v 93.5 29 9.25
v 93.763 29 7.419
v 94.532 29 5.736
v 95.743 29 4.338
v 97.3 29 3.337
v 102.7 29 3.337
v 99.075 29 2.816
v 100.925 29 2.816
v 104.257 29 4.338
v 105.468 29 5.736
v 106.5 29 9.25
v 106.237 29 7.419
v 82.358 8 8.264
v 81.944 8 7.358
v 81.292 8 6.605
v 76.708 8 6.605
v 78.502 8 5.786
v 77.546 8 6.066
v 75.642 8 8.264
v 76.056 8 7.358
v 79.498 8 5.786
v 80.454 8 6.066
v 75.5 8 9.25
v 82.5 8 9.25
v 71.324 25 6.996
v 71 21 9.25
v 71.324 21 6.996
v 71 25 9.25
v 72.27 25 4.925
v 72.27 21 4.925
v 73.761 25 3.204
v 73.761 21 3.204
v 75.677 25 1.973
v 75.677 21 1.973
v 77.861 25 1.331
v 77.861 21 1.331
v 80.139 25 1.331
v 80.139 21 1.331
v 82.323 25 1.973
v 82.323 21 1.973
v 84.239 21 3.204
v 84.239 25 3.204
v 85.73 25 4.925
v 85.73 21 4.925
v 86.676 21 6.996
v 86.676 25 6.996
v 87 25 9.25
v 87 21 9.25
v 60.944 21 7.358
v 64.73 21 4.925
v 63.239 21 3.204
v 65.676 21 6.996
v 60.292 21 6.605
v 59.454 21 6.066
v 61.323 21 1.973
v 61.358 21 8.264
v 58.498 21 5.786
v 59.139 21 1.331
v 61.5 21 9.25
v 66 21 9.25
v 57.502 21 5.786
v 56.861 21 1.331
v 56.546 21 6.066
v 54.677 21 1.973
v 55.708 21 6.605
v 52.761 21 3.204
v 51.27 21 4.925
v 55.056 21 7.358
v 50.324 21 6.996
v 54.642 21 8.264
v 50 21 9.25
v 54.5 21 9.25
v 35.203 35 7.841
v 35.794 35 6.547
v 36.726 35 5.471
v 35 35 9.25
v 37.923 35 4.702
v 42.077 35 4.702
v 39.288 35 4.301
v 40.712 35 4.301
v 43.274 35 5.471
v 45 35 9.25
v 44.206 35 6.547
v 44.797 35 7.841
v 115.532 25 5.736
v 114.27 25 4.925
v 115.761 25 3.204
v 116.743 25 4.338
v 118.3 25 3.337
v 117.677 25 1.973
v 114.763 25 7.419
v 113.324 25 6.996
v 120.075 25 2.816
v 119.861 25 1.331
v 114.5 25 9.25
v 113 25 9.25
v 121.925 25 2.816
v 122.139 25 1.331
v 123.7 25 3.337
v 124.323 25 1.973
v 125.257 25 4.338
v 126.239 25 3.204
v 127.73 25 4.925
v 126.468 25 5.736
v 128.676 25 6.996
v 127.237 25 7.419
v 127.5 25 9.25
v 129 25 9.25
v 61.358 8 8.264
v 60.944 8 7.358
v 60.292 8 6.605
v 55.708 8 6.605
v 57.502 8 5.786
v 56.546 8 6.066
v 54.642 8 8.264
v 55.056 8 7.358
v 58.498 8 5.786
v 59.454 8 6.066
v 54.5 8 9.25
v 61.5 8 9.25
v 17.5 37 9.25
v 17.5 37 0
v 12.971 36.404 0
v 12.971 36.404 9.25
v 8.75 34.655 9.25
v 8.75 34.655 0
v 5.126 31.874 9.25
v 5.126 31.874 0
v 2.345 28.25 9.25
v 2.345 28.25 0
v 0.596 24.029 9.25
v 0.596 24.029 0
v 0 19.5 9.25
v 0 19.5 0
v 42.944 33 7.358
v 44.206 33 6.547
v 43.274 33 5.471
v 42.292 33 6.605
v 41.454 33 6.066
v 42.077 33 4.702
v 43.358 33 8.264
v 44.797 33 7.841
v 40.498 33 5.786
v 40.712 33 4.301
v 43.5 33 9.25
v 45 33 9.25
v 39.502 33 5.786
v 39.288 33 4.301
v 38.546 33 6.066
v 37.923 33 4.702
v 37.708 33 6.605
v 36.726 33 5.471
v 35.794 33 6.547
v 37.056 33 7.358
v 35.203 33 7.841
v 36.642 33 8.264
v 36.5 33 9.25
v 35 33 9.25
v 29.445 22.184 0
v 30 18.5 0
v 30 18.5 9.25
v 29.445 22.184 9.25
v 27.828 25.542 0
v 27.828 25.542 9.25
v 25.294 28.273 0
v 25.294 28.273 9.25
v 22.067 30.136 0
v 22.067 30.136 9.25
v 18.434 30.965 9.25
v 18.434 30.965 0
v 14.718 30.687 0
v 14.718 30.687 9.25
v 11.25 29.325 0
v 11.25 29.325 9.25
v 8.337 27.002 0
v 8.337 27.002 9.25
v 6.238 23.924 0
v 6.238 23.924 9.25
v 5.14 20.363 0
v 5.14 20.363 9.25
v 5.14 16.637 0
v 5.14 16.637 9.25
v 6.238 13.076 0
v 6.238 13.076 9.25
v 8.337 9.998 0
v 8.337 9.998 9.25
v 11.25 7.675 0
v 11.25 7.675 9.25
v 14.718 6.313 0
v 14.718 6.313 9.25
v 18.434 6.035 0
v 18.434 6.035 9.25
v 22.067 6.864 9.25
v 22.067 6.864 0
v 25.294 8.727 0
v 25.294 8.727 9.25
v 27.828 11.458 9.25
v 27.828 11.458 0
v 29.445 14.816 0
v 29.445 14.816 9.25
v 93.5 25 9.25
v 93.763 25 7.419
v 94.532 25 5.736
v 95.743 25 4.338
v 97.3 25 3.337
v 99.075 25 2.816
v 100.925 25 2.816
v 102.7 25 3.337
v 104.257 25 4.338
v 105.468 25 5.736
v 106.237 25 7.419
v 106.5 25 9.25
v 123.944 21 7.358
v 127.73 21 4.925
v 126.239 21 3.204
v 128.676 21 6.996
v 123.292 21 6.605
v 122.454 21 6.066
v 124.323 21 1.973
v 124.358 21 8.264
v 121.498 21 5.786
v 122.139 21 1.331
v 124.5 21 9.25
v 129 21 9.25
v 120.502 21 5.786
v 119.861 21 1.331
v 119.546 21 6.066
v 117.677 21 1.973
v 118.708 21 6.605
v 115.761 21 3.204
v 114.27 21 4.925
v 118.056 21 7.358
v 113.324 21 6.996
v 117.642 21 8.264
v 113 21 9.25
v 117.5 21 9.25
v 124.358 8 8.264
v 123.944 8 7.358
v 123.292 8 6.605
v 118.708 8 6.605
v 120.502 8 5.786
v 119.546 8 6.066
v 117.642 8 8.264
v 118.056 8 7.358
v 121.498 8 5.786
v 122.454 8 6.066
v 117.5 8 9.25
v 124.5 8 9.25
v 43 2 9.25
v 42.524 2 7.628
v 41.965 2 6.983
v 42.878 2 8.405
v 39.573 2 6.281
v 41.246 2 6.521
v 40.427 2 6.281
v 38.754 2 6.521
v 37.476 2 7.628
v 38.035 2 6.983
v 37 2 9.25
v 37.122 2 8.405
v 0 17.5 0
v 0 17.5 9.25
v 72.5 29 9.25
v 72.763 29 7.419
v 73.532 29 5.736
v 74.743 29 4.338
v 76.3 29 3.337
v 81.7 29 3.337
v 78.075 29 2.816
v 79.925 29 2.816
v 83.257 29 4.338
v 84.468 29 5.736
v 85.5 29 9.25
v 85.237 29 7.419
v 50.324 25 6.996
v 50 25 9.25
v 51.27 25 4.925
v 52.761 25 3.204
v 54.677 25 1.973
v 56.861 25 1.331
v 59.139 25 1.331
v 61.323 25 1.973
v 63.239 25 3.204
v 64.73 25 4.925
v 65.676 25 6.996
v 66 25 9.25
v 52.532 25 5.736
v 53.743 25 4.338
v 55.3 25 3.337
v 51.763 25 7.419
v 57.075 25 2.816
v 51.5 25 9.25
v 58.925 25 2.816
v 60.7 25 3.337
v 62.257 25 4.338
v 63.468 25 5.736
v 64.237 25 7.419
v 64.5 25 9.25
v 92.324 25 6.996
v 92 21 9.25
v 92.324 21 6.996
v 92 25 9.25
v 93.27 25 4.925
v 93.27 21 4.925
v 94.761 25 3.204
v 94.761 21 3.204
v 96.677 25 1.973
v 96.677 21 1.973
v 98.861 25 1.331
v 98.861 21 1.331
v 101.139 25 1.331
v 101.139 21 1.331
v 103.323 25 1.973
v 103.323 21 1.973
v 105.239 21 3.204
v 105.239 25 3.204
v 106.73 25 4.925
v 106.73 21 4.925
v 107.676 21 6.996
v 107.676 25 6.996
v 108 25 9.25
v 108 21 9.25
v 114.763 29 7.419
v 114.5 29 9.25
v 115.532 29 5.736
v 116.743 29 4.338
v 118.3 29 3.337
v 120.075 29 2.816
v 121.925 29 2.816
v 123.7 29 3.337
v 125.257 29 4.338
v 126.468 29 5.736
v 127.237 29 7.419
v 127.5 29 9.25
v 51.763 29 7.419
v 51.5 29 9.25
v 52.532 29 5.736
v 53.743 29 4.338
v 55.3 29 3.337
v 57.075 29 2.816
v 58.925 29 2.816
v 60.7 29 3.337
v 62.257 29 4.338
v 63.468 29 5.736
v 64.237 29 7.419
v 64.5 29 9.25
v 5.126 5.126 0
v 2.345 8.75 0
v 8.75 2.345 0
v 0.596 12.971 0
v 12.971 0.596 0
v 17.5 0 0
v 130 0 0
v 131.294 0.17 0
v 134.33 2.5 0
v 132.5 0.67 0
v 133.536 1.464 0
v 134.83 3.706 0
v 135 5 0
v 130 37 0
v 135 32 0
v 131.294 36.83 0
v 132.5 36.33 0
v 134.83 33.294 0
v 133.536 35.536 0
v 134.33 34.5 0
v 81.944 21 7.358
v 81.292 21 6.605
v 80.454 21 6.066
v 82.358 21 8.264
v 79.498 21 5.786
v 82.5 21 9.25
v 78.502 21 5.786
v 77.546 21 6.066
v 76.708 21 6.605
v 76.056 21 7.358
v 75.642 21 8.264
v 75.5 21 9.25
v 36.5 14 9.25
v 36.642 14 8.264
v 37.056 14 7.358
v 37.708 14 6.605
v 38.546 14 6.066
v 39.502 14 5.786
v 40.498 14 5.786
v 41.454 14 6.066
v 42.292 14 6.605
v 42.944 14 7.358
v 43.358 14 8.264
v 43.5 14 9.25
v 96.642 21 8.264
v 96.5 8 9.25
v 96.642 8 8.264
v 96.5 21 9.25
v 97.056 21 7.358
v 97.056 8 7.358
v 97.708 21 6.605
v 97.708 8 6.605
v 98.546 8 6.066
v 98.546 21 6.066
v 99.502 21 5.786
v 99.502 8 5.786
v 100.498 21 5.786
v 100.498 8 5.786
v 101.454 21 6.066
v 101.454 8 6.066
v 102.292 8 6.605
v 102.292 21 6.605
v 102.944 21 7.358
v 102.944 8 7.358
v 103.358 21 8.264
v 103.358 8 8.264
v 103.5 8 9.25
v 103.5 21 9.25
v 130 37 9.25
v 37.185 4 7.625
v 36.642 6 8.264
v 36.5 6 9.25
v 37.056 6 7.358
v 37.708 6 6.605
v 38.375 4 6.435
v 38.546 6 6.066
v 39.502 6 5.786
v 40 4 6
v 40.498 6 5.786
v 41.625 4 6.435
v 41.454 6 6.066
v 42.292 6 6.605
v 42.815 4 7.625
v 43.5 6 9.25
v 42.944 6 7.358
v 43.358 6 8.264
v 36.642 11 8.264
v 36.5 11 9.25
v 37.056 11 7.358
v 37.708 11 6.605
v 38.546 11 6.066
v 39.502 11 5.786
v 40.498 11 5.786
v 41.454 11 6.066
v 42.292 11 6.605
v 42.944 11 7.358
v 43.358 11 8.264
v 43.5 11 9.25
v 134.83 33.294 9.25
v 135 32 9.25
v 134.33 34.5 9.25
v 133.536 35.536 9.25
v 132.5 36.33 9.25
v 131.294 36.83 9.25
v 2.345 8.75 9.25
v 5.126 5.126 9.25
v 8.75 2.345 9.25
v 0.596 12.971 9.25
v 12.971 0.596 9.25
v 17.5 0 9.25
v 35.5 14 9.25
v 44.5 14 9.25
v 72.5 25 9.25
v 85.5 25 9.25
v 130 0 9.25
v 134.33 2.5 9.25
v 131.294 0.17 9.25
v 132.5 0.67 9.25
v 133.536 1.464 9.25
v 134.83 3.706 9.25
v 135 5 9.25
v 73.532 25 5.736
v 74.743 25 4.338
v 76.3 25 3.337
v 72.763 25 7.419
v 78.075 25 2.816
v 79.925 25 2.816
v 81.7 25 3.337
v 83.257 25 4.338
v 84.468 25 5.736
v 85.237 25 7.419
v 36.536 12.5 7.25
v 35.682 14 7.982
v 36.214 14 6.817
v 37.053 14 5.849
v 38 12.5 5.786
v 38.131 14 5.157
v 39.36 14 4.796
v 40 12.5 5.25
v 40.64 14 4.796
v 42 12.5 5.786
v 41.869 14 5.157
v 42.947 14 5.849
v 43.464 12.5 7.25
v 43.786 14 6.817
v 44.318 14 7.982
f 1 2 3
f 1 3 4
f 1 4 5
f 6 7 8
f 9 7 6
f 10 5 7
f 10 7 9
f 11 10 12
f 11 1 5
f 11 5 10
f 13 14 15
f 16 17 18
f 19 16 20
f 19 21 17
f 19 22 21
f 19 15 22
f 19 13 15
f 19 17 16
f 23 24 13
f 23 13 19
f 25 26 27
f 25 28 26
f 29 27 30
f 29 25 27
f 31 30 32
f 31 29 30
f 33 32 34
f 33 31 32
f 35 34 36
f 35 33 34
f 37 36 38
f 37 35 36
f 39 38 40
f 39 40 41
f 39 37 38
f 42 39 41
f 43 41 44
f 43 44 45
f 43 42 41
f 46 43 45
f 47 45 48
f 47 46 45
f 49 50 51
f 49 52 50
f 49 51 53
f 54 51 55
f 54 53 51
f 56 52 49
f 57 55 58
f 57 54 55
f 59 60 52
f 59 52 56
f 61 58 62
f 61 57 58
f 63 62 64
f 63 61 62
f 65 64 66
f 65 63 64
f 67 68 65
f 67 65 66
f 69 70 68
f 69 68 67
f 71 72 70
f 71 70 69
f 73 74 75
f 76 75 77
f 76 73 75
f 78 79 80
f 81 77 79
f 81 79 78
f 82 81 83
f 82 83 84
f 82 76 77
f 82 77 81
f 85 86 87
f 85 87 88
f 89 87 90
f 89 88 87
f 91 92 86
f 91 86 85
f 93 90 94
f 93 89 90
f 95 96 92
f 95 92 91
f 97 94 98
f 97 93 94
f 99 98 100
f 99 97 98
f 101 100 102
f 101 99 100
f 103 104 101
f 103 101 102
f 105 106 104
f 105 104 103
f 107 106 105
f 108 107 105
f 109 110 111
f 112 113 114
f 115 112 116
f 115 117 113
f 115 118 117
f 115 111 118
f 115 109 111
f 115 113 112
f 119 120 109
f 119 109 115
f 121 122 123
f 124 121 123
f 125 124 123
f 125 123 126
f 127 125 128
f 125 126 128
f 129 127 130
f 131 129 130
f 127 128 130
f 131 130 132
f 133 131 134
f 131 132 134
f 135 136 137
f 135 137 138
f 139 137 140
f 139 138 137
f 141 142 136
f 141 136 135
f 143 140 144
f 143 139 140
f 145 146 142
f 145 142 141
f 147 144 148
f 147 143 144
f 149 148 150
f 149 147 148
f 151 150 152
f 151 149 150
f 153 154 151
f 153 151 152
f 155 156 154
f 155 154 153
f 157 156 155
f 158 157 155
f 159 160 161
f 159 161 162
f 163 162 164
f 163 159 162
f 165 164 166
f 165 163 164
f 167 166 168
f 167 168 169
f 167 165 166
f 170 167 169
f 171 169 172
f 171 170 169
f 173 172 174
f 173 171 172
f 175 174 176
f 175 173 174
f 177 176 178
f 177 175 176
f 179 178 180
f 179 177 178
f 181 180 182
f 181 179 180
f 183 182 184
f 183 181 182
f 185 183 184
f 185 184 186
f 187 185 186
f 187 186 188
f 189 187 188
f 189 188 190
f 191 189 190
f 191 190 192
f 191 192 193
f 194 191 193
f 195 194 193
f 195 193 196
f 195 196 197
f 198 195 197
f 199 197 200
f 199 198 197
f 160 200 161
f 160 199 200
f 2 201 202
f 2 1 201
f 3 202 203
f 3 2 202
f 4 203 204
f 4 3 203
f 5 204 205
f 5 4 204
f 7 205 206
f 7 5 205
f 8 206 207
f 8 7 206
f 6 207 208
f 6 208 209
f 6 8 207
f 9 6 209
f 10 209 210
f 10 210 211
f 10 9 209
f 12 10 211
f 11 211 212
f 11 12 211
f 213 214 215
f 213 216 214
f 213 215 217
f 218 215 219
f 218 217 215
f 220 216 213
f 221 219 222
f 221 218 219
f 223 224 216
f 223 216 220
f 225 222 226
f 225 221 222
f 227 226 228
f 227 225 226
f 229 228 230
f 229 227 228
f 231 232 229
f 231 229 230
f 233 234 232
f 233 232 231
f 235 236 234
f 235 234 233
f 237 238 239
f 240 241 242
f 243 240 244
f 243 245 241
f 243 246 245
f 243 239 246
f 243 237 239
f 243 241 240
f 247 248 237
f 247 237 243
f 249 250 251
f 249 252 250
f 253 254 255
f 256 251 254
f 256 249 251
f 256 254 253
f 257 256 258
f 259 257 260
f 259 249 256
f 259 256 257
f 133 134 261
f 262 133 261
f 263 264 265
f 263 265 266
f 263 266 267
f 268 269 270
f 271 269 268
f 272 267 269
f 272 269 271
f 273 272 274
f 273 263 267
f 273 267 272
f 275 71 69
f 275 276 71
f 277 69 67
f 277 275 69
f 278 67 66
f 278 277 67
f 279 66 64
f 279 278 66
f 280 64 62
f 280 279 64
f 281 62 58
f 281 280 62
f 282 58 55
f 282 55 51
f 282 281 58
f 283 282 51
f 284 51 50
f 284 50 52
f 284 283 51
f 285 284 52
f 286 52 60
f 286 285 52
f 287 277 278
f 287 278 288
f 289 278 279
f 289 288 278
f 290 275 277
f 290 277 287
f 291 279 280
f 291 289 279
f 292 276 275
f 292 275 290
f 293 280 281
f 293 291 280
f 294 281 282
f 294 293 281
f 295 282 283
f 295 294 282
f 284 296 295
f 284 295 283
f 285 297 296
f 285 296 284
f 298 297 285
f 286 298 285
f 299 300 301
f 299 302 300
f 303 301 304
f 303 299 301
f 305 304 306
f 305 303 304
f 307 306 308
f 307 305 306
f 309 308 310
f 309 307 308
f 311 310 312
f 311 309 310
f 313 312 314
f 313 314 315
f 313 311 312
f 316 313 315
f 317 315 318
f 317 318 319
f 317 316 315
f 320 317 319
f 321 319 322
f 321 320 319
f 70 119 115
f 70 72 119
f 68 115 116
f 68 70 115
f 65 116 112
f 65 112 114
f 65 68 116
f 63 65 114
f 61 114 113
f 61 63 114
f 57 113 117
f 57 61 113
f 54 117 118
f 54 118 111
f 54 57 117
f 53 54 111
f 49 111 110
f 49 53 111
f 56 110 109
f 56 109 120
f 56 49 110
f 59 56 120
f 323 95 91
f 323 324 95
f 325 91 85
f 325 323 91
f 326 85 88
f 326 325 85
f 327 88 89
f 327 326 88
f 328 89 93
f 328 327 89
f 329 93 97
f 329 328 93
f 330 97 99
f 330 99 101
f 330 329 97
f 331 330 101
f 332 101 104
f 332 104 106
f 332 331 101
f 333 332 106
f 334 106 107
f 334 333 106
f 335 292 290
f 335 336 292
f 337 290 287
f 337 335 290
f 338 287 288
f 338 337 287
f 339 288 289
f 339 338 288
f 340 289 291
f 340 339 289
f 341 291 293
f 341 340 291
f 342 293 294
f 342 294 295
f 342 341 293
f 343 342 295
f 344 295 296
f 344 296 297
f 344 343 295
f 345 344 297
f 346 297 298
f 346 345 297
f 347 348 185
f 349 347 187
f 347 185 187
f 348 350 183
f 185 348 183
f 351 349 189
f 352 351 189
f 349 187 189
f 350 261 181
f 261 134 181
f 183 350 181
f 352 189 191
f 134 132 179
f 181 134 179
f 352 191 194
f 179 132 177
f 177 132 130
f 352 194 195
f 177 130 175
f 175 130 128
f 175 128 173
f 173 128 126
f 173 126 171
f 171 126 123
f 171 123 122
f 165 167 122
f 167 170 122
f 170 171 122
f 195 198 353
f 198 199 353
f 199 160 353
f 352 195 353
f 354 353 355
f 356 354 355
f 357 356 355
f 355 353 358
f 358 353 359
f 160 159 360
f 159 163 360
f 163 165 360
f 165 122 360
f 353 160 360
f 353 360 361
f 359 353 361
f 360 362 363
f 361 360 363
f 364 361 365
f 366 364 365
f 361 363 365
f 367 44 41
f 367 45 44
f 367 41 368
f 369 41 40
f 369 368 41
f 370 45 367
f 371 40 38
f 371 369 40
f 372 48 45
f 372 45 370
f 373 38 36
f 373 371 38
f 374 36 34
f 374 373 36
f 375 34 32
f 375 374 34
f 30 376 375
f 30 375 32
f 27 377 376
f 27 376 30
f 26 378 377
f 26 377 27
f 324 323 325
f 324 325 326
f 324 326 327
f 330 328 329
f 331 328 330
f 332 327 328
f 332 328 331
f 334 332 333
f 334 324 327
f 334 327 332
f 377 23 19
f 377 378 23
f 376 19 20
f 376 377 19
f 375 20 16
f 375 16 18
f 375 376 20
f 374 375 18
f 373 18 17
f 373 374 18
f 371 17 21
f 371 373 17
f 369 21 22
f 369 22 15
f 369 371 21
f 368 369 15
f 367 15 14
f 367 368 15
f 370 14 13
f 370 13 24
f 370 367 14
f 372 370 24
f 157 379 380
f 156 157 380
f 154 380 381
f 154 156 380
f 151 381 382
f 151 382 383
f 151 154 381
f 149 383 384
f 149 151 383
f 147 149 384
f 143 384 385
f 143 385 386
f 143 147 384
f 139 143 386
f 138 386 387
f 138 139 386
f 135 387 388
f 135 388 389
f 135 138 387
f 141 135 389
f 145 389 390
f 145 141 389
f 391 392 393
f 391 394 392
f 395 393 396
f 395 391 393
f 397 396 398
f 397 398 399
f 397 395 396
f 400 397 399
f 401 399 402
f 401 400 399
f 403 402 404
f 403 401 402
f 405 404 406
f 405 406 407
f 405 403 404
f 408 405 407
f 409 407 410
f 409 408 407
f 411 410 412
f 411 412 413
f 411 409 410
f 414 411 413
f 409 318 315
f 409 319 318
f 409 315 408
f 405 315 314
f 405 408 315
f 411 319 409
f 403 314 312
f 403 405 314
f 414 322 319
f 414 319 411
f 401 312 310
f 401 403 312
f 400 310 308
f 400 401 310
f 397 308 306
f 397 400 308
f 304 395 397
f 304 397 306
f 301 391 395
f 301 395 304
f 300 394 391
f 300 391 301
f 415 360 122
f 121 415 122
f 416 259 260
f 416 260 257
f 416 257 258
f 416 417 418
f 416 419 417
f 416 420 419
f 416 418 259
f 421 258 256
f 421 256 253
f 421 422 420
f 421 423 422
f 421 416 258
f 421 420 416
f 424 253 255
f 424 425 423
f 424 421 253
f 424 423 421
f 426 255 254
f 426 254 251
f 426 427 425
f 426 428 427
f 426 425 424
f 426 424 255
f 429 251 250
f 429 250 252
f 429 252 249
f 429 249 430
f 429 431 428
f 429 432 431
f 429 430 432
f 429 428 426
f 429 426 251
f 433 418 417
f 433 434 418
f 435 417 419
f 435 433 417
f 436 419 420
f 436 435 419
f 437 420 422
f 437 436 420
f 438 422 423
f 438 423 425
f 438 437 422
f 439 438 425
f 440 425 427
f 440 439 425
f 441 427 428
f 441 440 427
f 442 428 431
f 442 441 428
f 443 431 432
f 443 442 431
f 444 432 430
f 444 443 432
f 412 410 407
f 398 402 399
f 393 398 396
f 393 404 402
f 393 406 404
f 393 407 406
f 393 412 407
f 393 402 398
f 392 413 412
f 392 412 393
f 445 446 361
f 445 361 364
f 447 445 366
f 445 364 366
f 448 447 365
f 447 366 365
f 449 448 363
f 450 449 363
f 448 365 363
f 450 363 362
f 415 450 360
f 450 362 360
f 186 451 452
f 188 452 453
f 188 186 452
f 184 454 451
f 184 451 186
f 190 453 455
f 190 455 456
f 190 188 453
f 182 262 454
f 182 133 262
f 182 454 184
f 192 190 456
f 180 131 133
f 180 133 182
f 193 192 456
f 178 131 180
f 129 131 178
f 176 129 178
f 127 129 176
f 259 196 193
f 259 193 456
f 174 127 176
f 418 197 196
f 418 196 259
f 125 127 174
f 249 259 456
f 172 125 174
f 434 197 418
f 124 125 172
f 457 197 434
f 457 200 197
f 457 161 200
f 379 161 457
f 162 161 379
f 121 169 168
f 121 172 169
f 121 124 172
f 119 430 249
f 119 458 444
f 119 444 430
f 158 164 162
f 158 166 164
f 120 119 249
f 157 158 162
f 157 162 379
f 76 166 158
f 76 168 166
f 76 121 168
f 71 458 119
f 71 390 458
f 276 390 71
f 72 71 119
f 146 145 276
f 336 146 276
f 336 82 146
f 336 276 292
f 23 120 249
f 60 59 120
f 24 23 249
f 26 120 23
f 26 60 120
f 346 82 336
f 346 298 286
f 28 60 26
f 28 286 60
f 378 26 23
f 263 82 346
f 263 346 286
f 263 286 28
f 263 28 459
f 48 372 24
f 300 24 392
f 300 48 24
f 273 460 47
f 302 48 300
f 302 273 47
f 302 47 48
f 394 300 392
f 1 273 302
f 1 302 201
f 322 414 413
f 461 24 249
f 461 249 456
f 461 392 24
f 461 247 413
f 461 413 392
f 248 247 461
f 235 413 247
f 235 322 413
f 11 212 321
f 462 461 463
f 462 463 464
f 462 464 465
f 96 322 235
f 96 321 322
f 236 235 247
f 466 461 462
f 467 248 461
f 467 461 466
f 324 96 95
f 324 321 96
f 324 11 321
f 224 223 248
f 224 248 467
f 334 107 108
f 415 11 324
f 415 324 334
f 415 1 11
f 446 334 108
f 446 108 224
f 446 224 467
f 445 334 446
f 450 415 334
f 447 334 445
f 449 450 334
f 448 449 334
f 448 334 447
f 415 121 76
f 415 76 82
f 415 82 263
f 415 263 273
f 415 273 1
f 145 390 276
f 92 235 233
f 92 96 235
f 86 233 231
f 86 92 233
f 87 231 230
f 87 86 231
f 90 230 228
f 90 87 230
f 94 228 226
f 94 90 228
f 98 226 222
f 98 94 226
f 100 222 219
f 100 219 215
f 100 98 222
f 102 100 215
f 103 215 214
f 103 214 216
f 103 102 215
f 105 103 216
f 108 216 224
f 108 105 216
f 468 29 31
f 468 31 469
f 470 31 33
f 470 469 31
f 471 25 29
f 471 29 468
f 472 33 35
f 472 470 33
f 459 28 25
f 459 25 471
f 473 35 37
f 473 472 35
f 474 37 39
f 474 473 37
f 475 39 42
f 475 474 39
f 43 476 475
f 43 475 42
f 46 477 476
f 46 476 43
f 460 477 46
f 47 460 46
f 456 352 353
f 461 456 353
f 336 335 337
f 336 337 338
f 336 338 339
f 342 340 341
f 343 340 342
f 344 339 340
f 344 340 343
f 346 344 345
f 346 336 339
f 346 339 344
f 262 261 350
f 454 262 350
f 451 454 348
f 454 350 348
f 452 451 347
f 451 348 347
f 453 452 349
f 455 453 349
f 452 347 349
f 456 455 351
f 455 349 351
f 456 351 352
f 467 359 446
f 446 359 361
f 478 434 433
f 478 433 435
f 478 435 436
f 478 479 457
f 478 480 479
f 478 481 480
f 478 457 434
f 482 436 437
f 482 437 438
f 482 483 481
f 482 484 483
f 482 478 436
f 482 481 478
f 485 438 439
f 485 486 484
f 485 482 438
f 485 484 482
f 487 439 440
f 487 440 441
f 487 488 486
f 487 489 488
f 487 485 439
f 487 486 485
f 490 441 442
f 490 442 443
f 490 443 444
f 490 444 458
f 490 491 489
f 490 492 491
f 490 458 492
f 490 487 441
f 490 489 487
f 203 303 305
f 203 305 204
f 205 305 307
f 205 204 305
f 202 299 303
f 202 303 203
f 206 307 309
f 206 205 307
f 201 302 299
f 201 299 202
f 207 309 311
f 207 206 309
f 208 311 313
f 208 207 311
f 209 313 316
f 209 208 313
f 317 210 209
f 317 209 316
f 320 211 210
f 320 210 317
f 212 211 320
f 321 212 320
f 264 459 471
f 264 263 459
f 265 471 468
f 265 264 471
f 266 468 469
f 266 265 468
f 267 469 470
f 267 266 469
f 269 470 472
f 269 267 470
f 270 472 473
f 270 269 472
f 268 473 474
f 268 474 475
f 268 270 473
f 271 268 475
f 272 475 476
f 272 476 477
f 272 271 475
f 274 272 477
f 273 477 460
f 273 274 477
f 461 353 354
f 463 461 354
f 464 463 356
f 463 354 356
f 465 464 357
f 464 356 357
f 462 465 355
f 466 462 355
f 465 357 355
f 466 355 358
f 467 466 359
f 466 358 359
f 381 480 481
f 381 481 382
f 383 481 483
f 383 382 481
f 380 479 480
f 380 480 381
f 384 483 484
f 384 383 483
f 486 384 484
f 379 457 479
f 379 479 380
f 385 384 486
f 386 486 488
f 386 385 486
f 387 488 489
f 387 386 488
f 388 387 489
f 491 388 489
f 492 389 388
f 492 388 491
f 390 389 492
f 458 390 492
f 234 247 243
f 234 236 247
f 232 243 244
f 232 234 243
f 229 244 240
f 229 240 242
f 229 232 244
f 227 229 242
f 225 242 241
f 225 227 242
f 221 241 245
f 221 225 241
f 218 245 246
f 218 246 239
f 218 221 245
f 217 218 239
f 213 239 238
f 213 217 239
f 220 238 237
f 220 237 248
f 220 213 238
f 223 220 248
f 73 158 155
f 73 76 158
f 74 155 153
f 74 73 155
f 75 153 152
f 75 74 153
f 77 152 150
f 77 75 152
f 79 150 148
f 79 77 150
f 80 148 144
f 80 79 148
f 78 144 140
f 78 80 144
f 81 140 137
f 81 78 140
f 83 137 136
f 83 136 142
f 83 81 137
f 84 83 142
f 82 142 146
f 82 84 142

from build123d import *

# Parameters (mm, degrees)
F0_R     = 12.5
F1_DEPTH = 9.25


with BuildPart() as f1:
    # F0 (on Top) → F1 (new body)
    with BuildSketch(Plane.XY):
        with BuildLine():
            ThreePointArc((0, 17.5), (5.125631, 5.125631), (17.5, 0))
            Line((17.5, 0), (130, 0))
            ThreePointArc((130, 0), (133.535534, 1.464466), (135, 5))
            Line((135, 5), (135, 32))
            ThreePointArc((135, 32), (133.535534, 35.535534), (130, 37))
            Line((130, 37), (17.5, 37))
            ThreePointArc((17.5, 37), (5.125631, 31.874369), (0, 19.5))
            Line((0, 19.5), (0, 17.5))
        make_face()
        with Locations((17.5, 18.5)):
            Circle(F0_R, mode=Mode.SUBTRACT)
    extrude(amount=F1_DEPTH)

    # F2 (on face) → F3 (revolve, cut)
    with BuildSketch(Plane.XY.offset(9.25)):
        Polygon((45, 35), (40, 35), (40, 33), (40, 13), (40, 2), (43, 2), (43.5, 6), (43.5, 11), (44.5, 14), (43.5, 14), (43.5, 33), (45, 33), align=None)
    revolve(axis=Axis((40, 23, 9.25), (0, -1, 0)), mode=Mode.SUBTRACT)

    # F2 (on face) → F4 (revolve, cut)
    with BuildSketch(Plane.XY.offset(9.25)):
        Polygon((64.5, 29), (58, 29), (58, 25), (58, 21), (58, 8), (61.5, 8), (61.5, 21), (66, 21), (66, 25), (64.5, 25), align=None)
    revolve(axis=Axis((58, 14.5, 9.25), (0, -1, 0)), mode=Mode.SUBTRACT)

    # F2 (on face) → F5 (revolve, cut)
    with BuildSketch(Plane.XY.offset(9.25)):
        Polygon((85.5, 29), (79, 29), (79, 25), (79, 21), (79, 8), (82.5, 8), (82.5, 21), (87, 21), (87, 25), (85.5, 25), align=None)
    revolve(axis=Axis((79, 14.5, 9.25), (0, -1, 0)), mode=Mode.SUBTRACT)

    # F2 (on face) → F6 (revolve, cut)
    with BuildSketch(Plane.XY.offset(9.25)):
        Polygon((106.5, 29), (100, 29), (100, 25), (100, 21), (100, 8), (103.5, 8), (103.5, 21), (108, 21), (108, 25), (106.5, 25), align=None)
    revolve(axis=Axis((100, 14.5, 9.25), (0, -1, 0)), mode=Mode.SUBTRACT)

    # F2 (on face) → F7 (revolve, cut)
    with BuildSketch(Plane.XY.offset(9.25)):
        Polygon((127.5, 29), (121, 29), (121, 25), (121, 21), (121, 8), (124.5, 8), (124.5, 21), (129, 21), (129, 25), (127.5, 25), align=None)
    revolve(axis=Axis((121, 14.5, 9.25), (0, -1, 0)), mode=Mode.SUBTRACT)


solid = f1.part
